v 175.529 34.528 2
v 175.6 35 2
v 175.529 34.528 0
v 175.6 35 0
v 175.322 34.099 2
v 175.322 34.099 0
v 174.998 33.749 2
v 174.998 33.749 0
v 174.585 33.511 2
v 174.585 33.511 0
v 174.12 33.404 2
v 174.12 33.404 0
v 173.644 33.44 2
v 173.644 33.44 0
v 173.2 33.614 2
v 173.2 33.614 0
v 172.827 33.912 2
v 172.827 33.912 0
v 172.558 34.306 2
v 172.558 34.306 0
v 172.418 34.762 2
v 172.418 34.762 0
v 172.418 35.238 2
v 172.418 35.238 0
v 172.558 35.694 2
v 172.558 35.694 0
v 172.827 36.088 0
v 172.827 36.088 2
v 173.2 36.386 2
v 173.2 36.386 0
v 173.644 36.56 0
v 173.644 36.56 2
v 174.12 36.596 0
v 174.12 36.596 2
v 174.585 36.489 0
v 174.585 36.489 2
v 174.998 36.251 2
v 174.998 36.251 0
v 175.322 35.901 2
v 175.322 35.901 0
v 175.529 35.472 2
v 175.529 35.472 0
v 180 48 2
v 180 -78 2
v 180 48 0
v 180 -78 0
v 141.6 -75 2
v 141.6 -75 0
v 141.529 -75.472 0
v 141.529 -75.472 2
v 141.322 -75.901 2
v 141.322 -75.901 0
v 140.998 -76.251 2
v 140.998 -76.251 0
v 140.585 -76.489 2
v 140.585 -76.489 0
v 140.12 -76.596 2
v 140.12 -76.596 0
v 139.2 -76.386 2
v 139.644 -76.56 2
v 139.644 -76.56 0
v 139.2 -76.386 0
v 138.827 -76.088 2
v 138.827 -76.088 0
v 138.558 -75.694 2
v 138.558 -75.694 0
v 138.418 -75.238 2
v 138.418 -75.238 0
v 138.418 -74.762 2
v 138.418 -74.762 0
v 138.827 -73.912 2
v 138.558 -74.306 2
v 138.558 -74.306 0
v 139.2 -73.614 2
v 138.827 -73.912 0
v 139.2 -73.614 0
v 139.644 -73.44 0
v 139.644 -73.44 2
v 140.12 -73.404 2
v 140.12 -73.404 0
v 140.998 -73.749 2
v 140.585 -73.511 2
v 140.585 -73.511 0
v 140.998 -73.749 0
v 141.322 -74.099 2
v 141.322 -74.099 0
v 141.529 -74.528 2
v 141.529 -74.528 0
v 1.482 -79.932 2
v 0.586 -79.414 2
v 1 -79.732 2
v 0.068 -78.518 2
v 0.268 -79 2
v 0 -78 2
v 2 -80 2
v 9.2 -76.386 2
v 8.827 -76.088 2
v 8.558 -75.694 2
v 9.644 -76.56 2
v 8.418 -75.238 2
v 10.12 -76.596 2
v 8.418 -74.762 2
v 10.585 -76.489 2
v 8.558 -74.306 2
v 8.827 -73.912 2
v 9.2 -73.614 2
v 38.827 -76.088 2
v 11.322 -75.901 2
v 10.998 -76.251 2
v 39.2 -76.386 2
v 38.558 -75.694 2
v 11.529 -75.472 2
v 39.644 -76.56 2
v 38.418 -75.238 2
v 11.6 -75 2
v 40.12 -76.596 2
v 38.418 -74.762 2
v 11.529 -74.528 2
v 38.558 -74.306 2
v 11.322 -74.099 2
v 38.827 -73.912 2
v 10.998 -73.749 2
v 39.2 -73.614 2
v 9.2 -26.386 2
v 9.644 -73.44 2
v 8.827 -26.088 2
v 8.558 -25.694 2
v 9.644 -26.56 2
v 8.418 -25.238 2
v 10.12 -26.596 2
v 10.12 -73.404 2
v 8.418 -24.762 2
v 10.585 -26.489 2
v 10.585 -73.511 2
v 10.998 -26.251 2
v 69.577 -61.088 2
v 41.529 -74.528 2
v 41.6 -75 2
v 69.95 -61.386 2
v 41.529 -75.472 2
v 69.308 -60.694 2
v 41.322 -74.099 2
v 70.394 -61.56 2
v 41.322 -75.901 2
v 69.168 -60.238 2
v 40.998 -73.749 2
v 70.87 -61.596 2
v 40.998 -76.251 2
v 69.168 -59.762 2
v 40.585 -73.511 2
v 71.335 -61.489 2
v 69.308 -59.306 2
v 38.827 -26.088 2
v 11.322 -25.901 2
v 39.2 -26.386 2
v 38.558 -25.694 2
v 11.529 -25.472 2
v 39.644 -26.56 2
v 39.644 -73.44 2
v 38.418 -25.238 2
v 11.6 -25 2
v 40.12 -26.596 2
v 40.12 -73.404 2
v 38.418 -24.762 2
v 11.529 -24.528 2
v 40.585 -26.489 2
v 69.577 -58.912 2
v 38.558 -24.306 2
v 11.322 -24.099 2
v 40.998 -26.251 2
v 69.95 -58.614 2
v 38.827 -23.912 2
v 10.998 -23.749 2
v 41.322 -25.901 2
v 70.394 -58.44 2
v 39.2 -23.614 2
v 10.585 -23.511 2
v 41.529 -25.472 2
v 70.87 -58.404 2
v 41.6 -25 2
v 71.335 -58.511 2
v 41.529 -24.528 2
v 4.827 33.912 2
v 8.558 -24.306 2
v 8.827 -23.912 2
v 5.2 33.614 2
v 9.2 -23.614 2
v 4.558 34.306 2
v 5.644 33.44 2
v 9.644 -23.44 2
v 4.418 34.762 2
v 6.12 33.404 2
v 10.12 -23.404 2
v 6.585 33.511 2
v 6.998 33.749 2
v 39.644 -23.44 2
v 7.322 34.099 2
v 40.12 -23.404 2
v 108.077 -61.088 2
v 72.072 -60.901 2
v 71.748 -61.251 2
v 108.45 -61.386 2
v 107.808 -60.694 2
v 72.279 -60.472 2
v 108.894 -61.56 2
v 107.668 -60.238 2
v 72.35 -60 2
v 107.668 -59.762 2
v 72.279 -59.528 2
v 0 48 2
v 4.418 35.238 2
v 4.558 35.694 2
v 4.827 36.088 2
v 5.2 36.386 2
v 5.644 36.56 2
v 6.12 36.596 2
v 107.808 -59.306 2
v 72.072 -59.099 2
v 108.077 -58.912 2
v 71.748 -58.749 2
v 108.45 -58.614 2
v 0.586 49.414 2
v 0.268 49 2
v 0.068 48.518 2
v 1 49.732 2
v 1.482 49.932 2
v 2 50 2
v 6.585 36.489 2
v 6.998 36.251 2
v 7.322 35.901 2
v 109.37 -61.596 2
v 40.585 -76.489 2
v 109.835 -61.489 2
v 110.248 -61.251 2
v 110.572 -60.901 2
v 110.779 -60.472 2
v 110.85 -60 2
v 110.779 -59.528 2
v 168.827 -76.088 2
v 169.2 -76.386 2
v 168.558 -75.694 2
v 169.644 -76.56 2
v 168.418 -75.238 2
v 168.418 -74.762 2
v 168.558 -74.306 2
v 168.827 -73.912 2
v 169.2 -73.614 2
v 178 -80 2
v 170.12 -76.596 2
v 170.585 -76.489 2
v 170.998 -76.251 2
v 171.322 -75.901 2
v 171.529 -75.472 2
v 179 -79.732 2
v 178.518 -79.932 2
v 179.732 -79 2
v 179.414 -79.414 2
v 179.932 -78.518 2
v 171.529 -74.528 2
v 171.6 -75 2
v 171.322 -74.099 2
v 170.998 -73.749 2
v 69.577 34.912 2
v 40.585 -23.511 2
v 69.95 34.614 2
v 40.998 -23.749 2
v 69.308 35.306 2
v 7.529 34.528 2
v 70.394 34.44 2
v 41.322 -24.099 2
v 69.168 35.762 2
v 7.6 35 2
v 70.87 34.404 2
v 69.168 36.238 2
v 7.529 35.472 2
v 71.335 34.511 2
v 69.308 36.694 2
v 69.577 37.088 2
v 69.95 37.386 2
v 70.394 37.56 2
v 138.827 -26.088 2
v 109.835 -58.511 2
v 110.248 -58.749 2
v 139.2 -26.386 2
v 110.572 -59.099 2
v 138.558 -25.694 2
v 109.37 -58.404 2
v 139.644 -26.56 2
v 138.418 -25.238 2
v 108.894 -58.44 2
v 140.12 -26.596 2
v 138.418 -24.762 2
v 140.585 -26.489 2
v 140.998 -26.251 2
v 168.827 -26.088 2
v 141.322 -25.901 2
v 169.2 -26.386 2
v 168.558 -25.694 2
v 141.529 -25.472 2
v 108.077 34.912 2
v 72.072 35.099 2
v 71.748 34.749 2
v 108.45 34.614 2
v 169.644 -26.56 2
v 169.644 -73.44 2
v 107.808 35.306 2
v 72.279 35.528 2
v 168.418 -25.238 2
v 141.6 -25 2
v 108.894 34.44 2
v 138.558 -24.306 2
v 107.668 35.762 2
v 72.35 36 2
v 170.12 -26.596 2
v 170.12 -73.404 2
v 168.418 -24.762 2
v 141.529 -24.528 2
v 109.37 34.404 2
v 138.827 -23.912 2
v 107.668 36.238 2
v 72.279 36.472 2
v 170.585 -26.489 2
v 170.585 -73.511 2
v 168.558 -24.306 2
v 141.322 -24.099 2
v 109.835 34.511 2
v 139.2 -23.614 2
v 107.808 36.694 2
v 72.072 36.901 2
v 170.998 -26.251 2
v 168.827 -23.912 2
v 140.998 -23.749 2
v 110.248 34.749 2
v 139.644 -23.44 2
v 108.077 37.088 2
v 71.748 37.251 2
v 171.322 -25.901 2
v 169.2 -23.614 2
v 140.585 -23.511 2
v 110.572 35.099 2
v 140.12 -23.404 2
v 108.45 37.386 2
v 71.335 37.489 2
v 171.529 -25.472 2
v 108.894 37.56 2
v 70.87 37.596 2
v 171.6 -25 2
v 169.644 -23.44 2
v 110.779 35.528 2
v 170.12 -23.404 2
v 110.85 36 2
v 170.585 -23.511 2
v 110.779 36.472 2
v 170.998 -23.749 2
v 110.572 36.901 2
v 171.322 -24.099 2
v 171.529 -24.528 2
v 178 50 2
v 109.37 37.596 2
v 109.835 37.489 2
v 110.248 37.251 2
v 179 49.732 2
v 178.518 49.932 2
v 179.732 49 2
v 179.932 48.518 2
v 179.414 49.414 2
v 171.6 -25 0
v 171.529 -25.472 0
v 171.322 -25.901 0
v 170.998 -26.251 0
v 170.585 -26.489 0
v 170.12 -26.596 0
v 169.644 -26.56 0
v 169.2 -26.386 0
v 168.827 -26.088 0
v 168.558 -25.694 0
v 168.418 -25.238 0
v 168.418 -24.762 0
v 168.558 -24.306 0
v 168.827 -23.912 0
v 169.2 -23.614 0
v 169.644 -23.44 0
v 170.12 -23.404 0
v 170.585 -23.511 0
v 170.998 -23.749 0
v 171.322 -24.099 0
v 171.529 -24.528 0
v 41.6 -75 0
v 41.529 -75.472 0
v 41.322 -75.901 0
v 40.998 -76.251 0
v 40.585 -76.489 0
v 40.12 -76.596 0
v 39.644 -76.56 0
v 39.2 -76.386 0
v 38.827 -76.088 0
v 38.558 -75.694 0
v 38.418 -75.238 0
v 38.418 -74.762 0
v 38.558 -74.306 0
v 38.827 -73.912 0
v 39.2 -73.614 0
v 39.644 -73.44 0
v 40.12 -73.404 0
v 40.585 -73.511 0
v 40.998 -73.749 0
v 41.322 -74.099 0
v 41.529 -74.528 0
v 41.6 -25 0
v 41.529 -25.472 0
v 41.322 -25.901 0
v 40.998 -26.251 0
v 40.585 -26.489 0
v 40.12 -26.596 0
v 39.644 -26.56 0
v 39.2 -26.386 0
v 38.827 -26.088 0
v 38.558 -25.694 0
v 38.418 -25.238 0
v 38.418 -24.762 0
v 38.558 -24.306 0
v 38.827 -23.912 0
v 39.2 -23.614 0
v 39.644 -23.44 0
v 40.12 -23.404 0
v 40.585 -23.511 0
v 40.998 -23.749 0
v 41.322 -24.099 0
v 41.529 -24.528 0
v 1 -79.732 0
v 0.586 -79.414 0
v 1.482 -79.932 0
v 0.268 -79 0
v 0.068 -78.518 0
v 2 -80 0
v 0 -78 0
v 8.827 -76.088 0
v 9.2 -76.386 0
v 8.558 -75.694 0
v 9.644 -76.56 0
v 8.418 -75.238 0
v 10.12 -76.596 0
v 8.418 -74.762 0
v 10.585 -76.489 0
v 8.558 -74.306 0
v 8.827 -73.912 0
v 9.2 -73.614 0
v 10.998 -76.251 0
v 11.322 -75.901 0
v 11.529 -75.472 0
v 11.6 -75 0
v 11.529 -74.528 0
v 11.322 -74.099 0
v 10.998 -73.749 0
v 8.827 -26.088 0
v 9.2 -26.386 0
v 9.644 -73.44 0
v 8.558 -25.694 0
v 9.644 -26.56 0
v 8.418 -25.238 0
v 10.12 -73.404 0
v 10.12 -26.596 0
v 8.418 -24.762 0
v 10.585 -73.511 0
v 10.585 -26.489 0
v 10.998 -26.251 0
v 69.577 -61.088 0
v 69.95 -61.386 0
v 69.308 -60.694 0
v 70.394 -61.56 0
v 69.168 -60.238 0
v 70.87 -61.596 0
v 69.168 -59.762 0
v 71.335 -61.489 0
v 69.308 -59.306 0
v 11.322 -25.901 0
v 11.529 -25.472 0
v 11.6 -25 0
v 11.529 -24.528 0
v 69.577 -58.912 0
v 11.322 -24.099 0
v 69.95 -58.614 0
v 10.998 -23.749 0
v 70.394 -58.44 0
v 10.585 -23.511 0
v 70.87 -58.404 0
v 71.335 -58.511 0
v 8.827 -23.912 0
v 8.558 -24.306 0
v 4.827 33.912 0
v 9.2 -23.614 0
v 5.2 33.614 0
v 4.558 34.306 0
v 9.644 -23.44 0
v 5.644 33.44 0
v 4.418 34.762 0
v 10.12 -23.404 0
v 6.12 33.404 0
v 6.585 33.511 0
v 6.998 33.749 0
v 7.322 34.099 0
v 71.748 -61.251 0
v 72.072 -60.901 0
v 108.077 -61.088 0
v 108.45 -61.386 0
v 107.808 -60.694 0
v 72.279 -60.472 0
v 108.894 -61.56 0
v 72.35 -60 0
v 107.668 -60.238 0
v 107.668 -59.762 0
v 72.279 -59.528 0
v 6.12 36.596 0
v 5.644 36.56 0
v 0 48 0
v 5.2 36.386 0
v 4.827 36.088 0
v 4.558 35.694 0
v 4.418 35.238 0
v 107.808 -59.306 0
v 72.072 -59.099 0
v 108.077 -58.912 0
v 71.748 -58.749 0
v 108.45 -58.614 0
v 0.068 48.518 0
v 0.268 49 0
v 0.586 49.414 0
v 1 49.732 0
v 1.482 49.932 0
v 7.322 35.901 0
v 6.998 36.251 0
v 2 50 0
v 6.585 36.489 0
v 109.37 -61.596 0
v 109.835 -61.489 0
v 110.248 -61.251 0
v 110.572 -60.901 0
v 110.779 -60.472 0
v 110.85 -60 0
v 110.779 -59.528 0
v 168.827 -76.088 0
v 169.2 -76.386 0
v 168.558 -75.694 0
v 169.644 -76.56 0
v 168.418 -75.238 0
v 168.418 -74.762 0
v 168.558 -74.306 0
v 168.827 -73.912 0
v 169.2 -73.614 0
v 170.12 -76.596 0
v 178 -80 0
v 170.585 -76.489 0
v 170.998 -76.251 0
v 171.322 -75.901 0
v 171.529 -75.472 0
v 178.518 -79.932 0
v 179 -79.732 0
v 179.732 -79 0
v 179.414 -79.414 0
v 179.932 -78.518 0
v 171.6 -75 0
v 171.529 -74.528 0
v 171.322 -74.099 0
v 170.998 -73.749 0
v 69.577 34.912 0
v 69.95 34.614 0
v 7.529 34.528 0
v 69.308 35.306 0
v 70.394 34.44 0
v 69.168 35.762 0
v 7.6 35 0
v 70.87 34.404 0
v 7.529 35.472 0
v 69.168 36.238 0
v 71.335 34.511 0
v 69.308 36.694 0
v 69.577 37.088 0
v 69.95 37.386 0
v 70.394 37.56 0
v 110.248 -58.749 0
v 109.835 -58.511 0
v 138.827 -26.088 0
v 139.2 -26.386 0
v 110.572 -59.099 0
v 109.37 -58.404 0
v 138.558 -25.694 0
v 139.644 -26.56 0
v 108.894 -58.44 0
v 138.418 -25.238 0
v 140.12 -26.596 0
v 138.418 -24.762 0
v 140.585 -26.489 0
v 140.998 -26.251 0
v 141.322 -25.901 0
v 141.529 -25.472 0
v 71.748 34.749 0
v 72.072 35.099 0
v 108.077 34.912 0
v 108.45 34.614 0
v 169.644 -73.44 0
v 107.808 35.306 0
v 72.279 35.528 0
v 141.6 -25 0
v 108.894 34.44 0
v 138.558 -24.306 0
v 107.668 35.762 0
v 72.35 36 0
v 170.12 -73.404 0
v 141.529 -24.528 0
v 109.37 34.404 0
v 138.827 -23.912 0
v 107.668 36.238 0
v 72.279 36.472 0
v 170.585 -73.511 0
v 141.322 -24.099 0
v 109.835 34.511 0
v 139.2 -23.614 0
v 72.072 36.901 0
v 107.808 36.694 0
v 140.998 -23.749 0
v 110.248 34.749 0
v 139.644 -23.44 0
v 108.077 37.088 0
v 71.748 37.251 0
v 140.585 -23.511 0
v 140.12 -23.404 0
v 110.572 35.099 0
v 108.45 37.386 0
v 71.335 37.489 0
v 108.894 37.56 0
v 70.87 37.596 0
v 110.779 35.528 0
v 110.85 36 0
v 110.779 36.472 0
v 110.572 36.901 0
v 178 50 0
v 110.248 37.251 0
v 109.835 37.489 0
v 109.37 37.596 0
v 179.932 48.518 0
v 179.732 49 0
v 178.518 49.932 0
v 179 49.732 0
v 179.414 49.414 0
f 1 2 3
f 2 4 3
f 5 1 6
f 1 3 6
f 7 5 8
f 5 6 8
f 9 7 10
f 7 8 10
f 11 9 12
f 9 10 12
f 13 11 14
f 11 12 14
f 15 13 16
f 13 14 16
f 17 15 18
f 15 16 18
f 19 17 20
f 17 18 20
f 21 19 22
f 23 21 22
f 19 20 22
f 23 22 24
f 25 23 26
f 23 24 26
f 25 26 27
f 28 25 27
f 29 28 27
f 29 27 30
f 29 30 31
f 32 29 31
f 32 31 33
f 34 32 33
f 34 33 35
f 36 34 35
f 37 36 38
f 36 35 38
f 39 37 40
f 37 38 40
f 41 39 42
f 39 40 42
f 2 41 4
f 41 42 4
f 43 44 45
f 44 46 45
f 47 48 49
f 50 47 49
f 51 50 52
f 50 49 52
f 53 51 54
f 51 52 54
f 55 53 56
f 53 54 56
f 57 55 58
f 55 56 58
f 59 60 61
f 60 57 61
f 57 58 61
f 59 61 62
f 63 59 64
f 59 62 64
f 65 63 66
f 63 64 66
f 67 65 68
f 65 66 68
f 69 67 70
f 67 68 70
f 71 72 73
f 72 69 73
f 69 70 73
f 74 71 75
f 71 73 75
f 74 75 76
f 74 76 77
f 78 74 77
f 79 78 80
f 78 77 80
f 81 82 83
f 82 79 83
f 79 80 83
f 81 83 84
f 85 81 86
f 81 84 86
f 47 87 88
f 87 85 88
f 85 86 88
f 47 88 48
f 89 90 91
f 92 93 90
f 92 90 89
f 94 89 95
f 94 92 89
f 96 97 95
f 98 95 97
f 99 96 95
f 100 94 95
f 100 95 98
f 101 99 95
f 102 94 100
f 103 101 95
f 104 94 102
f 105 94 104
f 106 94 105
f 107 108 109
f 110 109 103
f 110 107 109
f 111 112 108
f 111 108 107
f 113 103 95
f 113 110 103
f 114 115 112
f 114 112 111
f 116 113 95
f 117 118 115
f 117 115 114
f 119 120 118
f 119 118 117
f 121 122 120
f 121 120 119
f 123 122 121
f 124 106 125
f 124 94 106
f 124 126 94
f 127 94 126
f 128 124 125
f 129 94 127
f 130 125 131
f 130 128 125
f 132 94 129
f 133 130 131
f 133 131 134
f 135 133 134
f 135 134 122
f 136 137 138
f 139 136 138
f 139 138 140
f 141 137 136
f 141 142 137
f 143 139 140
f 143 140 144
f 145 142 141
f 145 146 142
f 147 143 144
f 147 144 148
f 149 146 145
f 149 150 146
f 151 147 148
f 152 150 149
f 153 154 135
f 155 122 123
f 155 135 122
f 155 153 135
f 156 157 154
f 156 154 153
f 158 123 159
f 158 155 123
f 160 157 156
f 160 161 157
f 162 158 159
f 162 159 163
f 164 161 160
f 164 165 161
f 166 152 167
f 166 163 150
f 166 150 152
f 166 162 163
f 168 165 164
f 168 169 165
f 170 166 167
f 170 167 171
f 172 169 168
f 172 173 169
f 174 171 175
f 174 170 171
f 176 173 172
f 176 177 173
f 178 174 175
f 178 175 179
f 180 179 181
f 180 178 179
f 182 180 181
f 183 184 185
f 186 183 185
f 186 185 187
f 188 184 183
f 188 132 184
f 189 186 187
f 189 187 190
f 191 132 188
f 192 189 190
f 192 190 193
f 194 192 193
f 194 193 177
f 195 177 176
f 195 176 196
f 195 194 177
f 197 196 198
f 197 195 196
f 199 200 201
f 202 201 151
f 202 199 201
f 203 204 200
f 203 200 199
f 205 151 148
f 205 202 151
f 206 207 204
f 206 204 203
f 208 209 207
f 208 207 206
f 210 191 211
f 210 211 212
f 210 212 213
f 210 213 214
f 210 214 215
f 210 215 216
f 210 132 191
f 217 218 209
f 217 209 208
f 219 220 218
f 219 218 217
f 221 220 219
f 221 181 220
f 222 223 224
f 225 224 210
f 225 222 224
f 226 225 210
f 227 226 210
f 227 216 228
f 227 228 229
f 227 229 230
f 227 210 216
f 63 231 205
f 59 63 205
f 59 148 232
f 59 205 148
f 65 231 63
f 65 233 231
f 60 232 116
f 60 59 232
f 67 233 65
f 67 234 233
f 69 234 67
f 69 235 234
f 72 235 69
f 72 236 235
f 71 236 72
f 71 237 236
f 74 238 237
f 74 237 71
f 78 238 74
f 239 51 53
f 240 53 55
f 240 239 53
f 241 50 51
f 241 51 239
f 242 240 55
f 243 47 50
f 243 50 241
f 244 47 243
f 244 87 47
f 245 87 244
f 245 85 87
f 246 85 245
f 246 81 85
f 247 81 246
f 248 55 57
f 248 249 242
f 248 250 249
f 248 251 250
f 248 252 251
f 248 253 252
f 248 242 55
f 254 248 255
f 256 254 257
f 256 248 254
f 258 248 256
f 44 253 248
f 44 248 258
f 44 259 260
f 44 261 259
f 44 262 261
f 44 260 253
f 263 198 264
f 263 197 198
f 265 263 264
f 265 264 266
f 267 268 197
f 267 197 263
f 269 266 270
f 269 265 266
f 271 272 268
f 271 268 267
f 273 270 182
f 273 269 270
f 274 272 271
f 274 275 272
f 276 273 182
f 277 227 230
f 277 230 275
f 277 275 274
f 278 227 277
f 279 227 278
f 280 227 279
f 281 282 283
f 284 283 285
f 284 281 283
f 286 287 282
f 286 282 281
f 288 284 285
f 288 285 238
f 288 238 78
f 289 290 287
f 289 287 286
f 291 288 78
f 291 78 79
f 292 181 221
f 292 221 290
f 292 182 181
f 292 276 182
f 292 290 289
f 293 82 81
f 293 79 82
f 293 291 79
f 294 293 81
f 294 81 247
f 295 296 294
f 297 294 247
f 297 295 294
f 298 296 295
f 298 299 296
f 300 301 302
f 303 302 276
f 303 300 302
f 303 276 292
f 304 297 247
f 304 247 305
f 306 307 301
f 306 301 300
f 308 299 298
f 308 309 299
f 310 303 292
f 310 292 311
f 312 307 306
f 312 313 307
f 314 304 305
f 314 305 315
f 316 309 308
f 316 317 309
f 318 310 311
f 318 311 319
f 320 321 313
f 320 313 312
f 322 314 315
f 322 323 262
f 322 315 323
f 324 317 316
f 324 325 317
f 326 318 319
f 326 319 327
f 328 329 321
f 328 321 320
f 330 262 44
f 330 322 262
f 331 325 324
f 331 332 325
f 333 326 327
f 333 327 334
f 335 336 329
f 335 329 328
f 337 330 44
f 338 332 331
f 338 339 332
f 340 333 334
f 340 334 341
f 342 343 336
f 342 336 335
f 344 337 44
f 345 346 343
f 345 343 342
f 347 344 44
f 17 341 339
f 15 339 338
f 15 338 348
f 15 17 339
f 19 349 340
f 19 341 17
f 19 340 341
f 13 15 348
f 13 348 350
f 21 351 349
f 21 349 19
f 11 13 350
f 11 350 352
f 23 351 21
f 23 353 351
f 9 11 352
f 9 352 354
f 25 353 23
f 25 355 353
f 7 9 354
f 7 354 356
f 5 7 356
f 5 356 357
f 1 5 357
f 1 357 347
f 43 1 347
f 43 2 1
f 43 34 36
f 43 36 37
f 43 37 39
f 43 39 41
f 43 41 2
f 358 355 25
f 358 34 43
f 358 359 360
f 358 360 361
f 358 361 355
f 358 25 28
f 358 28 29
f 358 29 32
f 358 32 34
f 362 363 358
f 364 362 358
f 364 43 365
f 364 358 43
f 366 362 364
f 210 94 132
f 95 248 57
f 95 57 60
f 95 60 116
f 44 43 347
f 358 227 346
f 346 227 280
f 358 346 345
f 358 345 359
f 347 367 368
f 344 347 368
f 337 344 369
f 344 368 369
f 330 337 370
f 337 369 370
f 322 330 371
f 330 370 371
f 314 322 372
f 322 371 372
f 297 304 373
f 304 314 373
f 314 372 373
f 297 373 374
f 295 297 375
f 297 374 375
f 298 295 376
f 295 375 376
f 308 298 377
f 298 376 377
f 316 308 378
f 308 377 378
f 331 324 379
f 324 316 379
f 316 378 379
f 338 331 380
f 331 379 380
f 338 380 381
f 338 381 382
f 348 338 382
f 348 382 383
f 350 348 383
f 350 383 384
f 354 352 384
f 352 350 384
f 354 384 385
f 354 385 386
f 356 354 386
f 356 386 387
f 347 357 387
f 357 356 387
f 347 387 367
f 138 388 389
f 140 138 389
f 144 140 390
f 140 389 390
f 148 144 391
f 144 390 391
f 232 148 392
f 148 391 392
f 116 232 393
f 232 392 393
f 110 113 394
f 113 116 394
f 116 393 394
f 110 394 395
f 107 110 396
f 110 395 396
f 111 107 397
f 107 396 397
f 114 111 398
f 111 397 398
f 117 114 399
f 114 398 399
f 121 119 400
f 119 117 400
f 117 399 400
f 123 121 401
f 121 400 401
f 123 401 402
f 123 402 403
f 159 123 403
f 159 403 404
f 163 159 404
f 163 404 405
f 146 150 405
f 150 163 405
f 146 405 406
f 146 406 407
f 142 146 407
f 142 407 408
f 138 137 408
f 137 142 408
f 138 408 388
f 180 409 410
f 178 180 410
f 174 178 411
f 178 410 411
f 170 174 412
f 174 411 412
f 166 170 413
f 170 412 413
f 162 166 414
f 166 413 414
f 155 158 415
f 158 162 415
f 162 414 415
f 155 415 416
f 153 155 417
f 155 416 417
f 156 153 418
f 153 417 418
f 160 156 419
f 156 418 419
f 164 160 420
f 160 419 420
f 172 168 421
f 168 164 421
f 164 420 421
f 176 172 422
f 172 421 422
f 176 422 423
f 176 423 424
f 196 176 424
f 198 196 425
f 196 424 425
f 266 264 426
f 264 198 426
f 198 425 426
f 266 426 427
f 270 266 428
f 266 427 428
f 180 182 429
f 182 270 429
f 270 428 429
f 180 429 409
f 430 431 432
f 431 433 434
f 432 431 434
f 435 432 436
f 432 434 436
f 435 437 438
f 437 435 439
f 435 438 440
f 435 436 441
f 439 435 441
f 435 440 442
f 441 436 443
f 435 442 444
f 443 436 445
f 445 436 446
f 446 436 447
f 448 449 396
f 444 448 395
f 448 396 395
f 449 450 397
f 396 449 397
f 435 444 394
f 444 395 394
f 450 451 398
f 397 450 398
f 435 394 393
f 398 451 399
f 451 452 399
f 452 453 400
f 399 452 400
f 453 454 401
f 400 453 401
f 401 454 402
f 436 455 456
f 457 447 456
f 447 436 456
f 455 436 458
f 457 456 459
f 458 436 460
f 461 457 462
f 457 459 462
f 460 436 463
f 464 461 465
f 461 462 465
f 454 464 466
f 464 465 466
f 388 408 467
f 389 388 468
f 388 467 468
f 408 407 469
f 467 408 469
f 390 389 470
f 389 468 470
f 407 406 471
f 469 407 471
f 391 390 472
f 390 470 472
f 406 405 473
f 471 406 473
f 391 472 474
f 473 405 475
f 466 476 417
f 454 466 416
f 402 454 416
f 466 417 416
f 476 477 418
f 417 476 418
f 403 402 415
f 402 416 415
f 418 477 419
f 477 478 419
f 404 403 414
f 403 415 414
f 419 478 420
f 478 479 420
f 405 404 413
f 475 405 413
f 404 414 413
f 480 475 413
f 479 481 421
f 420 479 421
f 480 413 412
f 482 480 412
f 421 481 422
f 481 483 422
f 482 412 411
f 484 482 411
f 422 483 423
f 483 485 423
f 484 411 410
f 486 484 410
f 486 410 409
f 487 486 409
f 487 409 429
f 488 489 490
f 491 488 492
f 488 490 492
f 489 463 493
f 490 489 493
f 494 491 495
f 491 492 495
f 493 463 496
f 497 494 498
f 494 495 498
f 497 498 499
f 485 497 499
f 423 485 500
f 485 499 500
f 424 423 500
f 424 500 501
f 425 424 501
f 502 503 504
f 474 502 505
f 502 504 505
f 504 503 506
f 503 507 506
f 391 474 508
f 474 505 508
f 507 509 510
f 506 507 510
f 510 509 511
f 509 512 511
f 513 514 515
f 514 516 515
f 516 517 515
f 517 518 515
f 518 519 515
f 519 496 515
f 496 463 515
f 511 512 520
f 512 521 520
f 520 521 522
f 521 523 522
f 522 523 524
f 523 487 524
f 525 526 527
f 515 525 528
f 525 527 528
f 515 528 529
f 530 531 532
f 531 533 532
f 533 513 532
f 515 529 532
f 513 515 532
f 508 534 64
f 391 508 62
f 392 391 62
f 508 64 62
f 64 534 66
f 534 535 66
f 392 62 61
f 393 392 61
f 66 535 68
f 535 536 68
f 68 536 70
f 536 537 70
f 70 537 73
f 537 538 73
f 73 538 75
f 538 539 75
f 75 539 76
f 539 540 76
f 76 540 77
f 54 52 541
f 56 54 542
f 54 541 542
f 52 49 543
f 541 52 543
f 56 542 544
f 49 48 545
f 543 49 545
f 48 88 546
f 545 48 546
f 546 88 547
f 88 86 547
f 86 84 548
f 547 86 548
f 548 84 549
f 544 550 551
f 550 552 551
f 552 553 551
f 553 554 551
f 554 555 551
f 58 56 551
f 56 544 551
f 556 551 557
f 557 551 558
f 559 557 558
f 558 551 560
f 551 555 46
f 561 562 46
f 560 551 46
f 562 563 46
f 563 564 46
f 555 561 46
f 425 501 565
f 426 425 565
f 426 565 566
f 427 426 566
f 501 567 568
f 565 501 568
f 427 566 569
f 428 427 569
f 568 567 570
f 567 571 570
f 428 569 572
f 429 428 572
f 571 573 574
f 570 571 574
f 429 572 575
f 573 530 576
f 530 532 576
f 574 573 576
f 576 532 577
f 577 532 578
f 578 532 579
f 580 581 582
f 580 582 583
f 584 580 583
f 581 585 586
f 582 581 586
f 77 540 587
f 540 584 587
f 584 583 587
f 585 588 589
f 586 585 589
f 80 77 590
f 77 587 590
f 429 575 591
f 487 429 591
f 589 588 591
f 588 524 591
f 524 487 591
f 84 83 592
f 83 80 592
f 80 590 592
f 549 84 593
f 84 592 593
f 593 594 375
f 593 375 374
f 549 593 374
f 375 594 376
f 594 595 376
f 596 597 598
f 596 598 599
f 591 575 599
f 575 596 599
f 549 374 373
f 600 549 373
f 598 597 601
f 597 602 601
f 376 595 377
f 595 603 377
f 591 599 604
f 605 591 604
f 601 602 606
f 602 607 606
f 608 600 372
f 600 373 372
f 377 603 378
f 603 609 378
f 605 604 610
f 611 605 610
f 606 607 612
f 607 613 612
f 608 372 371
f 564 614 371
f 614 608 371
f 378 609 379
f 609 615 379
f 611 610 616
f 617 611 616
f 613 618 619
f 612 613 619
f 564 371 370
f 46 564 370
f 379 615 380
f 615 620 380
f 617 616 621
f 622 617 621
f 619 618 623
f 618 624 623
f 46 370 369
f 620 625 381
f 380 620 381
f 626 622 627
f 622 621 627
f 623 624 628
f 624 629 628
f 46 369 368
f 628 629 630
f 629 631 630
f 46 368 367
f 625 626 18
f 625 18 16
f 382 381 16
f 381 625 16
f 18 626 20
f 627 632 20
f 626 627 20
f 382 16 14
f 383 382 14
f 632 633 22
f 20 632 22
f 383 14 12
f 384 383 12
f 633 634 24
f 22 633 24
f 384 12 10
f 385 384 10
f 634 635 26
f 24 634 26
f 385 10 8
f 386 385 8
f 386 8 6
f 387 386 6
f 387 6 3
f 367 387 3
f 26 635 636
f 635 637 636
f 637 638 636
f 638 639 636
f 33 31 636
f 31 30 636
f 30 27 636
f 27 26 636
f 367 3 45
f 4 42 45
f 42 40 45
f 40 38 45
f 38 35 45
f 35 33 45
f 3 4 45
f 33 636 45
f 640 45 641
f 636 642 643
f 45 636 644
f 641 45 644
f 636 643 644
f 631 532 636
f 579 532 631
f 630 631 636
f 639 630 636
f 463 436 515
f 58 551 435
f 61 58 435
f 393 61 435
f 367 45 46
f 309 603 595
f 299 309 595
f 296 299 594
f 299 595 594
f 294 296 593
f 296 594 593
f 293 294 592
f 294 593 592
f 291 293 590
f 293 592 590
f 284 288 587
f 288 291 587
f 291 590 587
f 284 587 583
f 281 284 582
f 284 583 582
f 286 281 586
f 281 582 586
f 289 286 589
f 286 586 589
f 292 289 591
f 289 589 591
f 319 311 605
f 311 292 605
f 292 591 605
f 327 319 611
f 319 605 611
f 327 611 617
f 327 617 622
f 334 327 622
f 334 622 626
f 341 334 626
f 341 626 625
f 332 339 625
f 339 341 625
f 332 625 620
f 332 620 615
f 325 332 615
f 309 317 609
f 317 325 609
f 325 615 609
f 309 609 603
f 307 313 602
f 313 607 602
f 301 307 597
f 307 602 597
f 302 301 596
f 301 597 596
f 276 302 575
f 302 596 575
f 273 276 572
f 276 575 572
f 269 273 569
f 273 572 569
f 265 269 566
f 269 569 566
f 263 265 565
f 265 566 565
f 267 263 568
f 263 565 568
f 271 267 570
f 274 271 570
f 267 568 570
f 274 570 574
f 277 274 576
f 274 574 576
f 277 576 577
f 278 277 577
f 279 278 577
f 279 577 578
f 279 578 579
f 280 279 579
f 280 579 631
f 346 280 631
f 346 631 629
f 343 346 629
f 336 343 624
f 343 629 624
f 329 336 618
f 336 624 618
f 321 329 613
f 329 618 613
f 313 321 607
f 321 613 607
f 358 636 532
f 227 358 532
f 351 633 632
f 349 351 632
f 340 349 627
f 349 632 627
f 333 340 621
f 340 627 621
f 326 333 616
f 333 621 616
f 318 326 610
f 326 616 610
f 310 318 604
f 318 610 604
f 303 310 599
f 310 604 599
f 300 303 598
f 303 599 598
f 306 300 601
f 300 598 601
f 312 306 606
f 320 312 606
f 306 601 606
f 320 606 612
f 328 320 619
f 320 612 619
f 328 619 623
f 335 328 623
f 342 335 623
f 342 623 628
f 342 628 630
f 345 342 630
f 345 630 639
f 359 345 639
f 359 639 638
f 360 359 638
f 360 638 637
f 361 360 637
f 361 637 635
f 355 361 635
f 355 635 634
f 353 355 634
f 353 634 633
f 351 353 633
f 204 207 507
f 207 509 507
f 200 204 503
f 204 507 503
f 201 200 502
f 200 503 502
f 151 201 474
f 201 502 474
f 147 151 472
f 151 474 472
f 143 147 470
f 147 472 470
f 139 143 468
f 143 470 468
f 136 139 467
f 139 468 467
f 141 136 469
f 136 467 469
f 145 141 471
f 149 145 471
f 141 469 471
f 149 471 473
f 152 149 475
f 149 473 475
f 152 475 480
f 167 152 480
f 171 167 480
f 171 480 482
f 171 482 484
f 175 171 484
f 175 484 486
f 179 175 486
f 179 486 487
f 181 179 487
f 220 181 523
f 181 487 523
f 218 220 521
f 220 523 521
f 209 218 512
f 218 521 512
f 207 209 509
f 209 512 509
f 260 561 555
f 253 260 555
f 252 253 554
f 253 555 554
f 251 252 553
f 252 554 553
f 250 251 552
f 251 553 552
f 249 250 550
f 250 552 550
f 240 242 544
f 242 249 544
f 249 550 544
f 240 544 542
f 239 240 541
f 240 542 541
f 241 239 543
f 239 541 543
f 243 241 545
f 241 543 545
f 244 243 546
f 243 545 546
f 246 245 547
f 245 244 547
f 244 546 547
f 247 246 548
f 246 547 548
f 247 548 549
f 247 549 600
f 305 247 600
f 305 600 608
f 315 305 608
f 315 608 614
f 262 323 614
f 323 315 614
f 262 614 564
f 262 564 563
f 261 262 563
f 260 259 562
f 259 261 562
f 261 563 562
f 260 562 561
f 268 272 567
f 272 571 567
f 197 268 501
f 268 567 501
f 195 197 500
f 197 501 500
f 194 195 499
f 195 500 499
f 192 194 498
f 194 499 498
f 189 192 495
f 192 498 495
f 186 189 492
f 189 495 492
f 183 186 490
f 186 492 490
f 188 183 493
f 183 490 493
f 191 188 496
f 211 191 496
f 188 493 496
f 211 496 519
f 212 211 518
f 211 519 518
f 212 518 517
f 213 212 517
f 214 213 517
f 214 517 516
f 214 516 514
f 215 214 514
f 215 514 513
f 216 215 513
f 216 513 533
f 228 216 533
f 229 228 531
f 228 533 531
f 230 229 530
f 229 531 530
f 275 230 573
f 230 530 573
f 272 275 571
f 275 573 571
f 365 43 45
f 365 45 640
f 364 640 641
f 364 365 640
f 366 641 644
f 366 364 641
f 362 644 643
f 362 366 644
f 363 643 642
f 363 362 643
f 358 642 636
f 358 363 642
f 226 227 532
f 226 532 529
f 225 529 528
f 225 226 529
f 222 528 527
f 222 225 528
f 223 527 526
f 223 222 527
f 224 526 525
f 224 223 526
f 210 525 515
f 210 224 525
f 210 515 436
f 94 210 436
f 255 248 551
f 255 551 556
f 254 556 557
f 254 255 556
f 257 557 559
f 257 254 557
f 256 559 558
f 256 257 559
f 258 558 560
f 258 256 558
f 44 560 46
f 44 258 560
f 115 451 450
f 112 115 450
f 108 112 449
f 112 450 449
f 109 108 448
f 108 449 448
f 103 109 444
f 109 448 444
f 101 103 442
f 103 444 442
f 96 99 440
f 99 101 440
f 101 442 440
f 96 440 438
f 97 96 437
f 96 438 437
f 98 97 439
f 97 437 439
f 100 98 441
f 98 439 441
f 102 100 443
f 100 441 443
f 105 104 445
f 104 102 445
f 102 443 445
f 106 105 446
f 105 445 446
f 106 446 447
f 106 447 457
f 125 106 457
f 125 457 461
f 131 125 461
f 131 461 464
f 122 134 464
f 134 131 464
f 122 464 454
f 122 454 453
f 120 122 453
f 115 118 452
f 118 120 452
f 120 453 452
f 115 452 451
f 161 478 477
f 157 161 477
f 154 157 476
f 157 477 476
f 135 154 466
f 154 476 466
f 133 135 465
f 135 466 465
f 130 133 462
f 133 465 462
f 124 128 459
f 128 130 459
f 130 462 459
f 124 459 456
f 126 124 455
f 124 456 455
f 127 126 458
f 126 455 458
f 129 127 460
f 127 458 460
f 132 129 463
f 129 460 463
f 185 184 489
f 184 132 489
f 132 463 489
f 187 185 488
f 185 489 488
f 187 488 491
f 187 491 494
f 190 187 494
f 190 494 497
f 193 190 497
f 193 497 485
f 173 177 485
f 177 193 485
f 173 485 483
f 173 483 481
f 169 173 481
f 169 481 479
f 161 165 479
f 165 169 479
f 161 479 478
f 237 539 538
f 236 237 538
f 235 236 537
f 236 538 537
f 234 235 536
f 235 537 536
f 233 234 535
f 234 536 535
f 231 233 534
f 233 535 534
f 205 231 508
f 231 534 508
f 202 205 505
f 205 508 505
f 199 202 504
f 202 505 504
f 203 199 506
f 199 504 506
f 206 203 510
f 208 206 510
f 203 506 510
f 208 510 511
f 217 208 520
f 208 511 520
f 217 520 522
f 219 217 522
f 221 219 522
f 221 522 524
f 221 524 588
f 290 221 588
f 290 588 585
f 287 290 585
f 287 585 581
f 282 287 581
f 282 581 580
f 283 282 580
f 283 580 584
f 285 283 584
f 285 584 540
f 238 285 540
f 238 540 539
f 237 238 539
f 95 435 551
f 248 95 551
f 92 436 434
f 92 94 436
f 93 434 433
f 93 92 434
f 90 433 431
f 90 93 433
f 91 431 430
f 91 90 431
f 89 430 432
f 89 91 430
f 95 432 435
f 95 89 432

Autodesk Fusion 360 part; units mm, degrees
sketch "スケッチ1" plane through (0, 0, 0) normal (0, 0, 1) x (1, 0, 0)
  line L0 (0, 0) -> (180, 0)
  line L1 (180, 0) -> (180, -100)
  line L2 (180, -100) -> (0, -100)
  line L3 (0, -100) -> (0, 0)
  line L4 (0, -50) -> (180, -50) construction
  line L5 (10, -50) -> (10, -25) construction
  line L6 (10, -25) -> (40, -25) construction
  line L7 (40, -25) -> (40, -50) construction
  line L8 (90, 0) -> (90, -100) construction
  line L9 (10, -50) -> (10, -75) construction
  line L10 (10, -75) -> (40, -75) construction
  line L11 (40, -75) -> (40, -50) construction
  line L12 (140, -75) -> (140, -50) construction
  line L13 (140, -25) -> (140, -50) construction
  line L14 (170, -25) -> (140, -25) construction
  line L15 (170, -50) -> (170, -25) construction
  line L16 (170, -50) -> (170, -75) construction
  line L17 (170, -75) -> (140, -75) construction
  circle A0 centre (10, -25) radius 1.6
  circle A1 centre (40, -25) radius 1.6
  circle A2 centre (10, -75) radius 1.6
  circle A3 centre (40, -75) radius 1.6
  circle A4 centre (170, -25) radius 1.6
  circle A5 centre (140, -25) radius 1.6
  circle A6 centre (140, -75) radius 1.6
  circle A7 centre (170, -75) radius 1.6
  line L18 (40, -37.5) -> (35, -37.5)
  line L19 (35, -37.5) -> (35, -65)
  line L20 (35, -65) -> (45, -65)
  line L21 (45, -65) -> (45, -37.5)
  line L22 (45, -37.5) -> (40, -37.5)
  line L23 (145, -65) -> (135, -65)
  line L24 (135, -65) -> (135, -37.5)
  line L25 (135, -37.5) -> (140, -37.5)
  line L26 (140, -37.5) -> (145, -37.5)
  line L27 (145, -37.5) -> (145, -65)
  line L28 (90, 0) -> (64.5, 0) construction
  line L29 (64.5, 0) -> (64.5, -100) construction
  line L30 (115.5, 0) -> (115.5, -100) construction
  line L31 (64.5, -50) -> (64.5, -9) construction
  line L32 (115.5, -91) -> (115.5, -79)
  circle A8 centre (5, -5) radius 1.6
  circle A9 centre (175, -5) radius 1.6
  circle A10 centre (5, -95) radius 1.6
  circle A11 centre (175, -95) radius 1.6
  line L33 (0, -10) -> (180, -10)
  line L34 (180, -90) -> (0, -90)
  line L35 (0, -80) -> (180, -80)
  line L36 (0, -20) -> (180, -20)
  line L37 (0, 0) -> (180, 0)
  line L38 (180, 0) -> (180, 50)
  line L39 (180, 50) -> (0, 50)
  line L40 (0, 50) -> (0, 0)
  line L41 (90, -60) -> (109.25, -60)
  line L42 (109.25, -60) -> (70.75, -60)
  line L43 (70.75, -60) -> (70.75, 36)
  line L44 (70.75, 36) -> (109.25, 36)
  line L45 (109.25, 36) -> (109.25, -60)
  line L46 (90, -60) -> (90, -80)
  circle A12 centre (70.75, -60) radius 1.6
  circle A13 centre (109.25, -60) radius 1.6
  circle A14 centre (70.75, 36) radius 1.6
  circle A15 centre (109.25, 36) radius 1.6
  line L47 (0, 50) -> (0, 35)
  line L48 (0, 35) -> (180, 35)
  line L49 (0, 35) -> (6, 35)
  circle A16 centre (6, 35) radius 1.6
  circle A17 centre (174, 35) radius 1.6
  dimension "d1" = 180
  dimension "d2" = 100
  dimension "d3" = 3.2
  dimension "d4" = 3.2
  dimension "d7" = 5
  dimension "d8" = 5
  dimension "d9" = 25.5
  dimension "d10" = 41
  dimension "d17" = 3.2
  dimension "d22" = 19.25
  dimension "d23" = 38.5
  dimension "d24" = 96
  dimension "d25" = 20
  dimension "d26" = 3.2
  dimension "d27" = 3.2
  dimension "d28" = 3.2
  dimension "d29" = 3.2
  dimension "d30" = 15
  dimension "d31" = 3.2
extrude "押し出し1" add sketch "スケッチ1" along normal blind 2 contours L0 L37 L40 L43 A14 L48 L49 A16 | L0 L3 L33 L37 L43 | L0 L37 L43 L45 A14 A15 L48 | L0 L33 L37 L43 L45 | L3 L33 L36 L43 | L38 L39 L40 L44 A14 A15 L47 L48 L49 A16 A17 | L0 L37 L38 L45 A15 L48 A17 | L0 L1 L33 L37 L45 | L33 L36 L43 L45 | L3 L35 L36 L42 L43 L46 A12 | L1 L33 L36 L45 | L36 L41 L42 L43 L45 A12 A13 | L44 A14 A15 L48 | L1 L35 L36 L41 L42 L45 L46 A13 | L18 L19 L20 L21 L22 | L23 L24 L25 L26 L27 | A8 | A9
fillet "フィレット1" radius 2 4 edges at (0, -80, 1) (180, -80, 1) (0, 50, 1) (180, 50, 1)
equation "d9 = ( 51 / 2 ) * 1 mm"
equation "d10 = ( 82 / 2 ) * 1 mm"
equation "d22 = ( 38.5 / 2 ) * 1 mm"
